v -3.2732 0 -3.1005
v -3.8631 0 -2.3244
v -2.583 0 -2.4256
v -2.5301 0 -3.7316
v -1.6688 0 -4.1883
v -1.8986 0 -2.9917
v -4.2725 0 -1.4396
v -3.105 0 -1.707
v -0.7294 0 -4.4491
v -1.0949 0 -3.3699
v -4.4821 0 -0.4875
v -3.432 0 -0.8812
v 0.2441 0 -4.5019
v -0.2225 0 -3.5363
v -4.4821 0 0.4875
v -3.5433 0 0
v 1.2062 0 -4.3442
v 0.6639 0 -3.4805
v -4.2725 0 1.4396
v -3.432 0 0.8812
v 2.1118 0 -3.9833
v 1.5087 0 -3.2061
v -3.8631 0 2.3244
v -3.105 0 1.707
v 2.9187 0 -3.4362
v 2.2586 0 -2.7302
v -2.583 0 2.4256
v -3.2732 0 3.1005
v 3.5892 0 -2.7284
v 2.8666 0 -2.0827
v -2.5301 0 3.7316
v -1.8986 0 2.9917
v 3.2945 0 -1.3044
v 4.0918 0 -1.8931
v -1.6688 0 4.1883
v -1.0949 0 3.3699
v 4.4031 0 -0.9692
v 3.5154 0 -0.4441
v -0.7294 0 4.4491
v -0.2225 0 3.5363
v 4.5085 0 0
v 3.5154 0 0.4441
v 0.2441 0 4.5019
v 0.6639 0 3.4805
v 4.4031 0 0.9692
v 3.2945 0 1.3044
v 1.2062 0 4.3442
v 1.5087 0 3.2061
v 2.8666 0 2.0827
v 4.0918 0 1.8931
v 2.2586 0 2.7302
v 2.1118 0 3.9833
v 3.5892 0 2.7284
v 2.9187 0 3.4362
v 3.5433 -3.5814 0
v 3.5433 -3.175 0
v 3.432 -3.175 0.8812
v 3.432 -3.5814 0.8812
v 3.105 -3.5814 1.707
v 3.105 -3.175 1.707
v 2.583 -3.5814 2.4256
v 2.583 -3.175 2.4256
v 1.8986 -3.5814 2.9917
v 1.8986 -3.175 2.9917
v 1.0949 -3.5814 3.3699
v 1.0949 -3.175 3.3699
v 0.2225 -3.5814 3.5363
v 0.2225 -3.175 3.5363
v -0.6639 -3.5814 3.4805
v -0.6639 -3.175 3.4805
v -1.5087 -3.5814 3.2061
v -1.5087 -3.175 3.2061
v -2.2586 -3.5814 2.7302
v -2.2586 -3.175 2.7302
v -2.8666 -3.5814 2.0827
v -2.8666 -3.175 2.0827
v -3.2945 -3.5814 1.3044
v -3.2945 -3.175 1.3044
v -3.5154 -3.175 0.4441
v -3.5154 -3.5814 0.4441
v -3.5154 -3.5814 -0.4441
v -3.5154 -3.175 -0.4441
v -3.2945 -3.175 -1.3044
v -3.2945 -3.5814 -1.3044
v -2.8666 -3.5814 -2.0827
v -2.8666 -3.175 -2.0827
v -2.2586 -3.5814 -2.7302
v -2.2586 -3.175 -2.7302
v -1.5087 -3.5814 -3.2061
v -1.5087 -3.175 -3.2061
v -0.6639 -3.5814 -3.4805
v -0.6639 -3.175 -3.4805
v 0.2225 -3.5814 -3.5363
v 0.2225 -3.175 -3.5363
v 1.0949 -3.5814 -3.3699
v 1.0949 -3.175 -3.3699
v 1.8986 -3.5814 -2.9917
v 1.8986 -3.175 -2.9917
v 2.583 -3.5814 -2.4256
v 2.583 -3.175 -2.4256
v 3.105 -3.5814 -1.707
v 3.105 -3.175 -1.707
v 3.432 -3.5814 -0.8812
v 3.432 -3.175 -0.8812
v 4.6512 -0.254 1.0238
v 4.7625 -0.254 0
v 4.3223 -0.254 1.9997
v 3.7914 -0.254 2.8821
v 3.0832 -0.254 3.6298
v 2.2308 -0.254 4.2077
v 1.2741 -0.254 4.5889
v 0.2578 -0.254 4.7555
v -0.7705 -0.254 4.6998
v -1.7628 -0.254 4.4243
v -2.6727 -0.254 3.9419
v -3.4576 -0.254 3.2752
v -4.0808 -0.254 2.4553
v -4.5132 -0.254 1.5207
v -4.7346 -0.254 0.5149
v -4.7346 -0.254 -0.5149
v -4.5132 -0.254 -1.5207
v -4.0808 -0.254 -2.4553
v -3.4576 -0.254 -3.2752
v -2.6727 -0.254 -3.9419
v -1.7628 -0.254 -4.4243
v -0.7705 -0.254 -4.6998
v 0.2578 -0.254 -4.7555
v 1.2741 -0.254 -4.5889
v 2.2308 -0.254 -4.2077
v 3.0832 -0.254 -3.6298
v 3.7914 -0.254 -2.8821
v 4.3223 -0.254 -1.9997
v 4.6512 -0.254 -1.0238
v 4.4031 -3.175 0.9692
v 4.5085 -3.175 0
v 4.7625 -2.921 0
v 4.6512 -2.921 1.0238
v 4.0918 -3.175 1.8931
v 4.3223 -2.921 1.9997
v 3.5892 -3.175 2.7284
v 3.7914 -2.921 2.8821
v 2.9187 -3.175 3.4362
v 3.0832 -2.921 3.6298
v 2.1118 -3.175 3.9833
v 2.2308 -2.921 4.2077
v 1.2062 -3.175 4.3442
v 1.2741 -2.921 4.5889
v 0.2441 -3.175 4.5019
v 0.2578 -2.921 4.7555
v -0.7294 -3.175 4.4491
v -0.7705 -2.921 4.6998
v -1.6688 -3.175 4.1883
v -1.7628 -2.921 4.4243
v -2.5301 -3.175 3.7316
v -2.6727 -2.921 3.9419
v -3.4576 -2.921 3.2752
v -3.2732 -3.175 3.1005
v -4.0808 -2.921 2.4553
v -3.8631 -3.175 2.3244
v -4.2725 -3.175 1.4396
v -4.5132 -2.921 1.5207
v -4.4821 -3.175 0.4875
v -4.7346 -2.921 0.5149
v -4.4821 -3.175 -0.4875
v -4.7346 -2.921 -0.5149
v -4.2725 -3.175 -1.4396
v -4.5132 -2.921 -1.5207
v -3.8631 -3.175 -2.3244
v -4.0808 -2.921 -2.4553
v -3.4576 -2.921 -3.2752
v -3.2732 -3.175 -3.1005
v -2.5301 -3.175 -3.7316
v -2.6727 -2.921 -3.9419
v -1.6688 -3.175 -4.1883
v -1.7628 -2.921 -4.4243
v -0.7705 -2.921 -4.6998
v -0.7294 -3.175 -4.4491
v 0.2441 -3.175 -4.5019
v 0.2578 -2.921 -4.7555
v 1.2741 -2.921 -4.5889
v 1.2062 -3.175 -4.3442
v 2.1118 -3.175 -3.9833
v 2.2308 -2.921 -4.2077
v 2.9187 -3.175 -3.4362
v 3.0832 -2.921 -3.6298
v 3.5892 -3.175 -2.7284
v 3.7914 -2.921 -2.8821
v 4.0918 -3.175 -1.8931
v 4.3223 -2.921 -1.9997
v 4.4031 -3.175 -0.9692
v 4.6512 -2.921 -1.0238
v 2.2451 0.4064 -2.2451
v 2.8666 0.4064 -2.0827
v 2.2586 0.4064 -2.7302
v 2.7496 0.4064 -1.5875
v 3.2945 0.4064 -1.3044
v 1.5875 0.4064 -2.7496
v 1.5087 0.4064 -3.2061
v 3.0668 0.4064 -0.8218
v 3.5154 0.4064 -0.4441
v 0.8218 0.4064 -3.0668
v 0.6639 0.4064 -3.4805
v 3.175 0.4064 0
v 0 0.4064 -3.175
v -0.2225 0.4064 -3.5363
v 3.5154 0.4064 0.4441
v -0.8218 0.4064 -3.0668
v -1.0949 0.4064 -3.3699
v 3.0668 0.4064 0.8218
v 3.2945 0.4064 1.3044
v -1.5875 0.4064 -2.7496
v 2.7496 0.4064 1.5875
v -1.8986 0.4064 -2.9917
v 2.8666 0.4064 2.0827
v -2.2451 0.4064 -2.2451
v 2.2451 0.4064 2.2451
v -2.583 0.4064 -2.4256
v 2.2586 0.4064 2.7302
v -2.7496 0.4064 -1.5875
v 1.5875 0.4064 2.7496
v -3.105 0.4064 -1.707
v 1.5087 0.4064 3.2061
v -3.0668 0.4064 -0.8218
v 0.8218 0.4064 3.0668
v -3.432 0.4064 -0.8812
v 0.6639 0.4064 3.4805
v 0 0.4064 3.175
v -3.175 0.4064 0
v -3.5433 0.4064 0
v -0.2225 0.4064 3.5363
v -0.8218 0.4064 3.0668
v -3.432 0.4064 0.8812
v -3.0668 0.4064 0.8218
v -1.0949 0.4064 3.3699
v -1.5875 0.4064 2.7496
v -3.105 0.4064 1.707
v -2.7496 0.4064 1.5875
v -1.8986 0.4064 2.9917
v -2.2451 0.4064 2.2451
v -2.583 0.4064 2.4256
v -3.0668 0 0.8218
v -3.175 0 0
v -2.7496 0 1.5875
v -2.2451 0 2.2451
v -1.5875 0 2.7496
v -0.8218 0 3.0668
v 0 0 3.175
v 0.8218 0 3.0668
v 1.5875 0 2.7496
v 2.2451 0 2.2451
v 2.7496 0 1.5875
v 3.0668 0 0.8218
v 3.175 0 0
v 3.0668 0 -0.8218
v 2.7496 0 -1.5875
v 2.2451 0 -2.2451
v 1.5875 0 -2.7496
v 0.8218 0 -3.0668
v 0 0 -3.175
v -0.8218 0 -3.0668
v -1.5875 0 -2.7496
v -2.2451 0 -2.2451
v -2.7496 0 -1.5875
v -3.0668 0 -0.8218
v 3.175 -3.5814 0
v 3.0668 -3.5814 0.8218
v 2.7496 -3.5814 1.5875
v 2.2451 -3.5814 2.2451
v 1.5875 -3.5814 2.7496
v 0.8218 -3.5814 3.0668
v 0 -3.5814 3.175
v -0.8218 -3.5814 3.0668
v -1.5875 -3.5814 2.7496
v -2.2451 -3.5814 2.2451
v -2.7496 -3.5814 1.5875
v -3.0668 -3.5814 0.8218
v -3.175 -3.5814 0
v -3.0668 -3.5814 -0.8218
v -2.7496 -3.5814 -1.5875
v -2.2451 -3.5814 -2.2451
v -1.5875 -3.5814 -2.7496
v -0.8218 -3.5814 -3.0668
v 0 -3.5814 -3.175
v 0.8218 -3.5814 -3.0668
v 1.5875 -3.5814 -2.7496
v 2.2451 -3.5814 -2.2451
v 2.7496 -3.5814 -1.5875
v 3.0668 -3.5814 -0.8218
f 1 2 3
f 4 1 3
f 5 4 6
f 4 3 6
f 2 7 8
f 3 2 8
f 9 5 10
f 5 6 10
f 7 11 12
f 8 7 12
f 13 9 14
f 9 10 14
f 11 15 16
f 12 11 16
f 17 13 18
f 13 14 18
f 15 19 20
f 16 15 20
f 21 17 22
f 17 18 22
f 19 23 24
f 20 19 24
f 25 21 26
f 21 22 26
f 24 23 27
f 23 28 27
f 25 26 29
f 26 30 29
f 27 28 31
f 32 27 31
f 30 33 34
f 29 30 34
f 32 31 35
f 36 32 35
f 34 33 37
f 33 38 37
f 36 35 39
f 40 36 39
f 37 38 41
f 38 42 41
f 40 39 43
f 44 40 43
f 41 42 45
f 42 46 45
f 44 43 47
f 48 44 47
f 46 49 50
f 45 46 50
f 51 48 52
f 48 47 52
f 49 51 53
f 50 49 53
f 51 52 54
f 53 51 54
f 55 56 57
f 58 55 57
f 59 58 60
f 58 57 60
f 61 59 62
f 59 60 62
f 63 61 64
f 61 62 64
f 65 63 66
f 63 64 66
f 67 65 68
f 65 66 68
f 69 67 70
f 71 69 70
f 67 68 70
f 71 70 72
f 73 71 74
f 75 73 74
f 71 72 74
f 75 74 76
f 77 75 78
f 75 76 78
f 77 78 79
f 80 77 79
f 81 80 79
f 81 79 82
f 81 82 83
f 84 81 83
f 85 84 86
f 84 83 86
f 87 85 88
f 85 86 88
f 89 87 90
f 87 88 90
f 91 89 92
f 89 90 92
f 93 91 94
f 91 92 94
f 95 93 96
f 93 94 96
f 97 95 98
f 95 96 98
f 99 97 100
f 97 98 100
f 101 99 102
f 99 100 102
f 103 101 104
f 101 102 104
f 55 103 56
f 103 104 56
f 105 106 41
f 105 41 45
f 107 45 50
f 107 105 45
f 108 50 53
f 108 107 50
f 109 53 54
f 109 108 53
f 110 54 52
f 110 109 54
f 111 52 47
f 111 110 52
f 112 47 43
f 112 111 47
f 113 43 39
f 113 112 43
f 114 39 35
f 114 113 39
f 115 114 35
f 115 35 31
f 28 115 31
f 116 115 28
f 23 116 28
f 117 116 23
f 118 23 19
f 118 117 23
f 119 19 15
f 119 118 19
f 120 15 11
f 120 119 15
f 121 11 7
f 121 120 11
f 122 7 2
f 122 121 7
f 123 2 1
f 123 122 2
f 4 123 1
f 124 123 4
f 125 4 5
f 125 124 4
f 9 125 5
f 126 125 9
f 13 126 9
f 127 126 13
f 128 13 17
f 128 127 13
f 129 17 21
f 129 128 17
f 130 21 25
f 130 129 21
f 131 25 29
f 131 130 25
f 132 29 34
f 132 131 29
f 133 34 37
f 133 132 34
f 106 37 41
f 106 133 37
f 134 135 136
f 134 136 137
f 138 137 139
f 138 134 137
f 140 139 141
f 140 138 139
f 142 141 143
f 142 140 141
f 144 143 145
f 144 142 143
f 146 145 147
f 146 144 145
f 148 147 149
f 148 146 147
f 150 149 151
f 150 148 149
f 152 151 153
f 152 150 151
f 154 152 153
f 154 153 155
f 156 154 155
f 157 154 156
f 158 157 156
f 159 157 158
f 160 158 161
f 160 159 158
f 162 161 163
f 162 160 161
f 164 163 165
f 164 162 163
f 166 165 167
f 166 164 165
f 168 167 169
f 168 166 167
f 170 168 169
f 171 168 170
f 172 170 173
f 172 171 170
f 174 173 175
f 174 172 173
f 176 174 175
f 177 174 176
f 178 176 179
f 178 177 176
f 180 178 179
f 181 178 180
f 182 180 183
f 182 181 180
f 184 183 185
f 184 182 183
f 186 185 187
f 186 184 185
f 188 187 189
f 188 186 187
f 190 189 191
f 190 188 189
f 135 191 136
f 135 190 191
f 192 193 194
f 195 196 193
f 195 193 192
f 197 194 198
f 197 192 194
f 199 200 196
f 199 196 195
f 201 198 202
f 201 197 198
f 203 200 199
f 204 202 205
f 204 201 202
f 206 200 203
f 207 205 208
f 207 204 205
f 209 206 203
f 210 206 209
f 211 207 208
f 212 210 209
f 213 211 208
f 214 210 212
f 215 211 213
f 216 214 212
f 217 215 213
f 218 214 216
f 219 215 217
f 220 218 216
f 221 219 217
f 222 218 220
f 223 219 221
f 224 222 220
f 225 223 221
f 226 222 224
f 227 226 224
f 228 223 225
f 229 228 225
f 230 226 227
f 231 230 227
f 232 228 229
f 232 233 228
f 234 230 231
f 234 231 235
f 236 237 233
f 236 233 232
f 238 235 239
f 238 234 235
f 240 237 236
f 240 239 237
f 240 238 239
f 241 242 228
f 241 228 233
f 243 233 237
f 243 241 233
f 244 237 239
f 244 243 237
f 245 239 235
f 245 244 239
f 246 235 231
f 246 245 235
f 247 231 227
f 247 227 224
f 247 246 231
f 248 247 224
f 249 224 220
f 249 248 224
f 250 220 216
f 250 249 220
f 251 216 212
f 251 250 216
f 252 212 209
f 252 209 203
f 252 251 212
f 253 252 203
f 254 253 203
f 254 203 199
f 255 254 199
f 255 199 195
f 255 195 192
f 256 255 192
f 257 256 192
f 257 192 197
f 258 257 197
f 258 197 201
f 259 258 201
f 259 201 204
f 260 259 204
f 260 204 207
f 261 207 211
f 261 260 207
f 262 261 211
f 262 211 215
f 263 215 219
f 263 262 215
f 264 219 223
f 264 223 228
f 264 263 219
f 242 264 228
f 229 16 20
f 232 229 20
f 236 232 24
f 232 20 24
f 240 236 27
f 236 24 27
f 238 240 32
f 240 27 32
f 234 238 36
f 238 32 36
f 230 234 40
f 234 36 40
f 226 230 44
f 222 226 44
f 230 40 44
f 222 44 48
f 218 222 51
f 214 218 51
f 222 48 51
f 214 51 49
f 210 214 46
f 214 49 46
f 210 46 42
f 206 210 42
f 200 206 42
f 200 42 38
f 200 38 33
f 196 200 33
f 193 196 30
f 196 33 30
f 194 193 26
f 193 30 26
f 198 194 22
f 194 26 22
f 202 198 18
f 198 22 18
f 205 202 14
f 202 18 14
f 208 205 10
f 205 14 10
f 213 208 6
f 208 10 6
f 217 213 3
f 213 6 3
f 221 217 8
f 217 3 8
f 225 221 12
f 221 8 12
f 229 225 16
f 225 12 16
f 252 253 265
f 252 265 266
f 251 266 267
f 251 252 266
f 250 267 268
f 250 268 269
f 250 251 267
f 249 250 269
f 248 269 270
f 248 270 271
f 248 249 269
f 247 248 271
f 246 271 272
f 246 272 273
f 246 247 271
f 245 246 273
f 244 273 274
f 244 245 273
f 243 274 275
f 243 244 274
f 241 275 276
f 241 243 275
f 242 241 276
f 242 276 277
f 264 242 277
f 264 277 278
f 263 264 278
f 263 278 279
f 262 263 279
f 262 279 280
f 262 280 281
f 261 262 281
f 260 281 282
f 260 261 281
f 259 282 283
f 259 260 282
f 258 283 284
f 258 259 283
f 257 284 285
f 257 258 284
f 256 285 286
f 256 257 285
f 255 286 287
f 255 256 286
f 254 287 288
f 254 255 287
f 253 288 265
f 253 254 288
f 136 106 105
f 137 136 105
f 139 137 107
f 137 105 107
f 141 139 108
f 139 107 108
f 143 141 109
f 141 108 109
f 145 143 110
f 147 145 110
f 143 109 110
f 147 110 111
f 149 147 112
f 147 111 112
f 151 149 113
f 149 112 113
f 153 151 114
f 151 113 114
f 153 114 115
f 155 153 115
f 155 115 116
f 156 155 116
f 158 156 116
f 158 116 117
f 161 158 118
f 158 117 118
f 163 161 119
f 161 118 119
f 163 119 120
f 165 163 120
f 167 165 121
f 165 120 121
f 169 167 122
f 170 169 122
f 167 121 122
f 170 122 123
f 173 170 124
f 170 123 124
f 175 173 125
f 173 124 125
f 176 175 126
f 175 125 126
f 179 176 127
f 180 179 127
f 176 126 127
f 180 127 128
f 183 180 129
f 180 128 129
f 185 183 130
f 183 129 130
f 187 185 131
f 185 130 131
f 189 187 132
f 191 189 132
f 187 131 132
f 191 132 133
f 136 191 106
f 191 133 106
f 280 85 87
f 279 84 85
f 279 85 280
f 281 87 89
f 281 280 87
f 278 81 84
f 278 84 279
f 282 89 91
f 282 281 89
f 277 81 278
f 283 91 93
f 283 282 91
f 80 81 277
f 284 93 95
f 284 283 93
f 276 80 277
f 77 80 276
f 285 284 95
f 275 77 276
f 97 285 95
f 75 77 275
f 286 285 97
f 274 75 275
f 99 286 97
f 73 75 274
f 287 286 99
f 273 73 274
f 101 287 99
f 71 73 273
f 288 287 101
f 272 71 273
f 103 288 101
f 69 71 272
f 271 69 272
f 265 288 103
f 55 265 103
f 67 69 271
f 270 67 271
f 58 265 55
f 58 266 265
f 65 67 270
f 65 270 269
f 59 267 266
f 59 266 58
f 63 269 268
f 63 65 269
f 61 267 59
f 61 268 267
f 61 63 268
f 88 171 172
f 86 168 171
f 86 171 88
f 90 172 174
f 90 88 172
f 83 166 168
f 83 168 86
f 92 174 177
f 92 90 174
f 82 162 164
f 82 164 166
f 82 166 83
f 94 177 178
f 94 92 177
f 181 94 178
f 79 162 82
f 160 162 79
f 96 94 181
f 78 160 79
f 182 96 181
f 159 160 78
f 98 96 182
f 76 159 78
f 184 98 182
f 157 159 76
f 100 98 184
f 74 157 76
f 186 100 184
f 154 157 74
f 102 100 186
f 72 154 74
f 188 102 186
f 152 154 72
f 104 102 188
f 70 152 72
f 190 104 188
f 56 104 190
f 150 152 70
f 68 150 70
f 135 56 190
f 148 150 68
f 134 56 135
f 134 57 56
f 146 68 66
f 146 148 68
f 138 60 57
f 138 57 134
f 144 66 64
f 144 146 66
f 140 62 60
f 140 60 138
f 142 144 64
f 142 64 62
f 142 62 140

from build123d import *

# Parameters (mm, degrees)
F0_R     = 4.7625
F0_R_2   = 3.175
F1_DEPTH = 3.175
F2_R     = 3.5433
F2_R_2   = 3.175
F3_DEPTH = 0.4064
F4_R     = 3.5433
F4_R_2   = 3.175
F5_DEPTH = 0.4064
F6_SIZE  = 0.254


with BuildPart() as f1:
    # F0 (on Front) → F1 (new body)
    with BuildSketch(Plane.XZ):
        Circle(F0_R)
        Circle(F0_R_2, mode=Mode.SUBTRACT)
    extrude(amount=F1_DEPTH)

    # F2 (on face) → F3 (join)
    with BuildSketch(Plane.XZ.offset(3.175)):
        Circle(F2_R)
        Circle(F2_R_2, mode=Mode.SUBTRACT)
    extrude(amount=F3_DEPTH)

    # F4 (on face) → F5 (join)
    with BuildSketch(Plane(origin=(0, 0, 0), x_dir=(-1, 0, 0), z_dir=(0, 1, 0))):
        Circle(F4_R)
        Circle(F4_R_2, mode=Mode.SUBTRACT)
    extrude(amount=F5_DEPTH)

    # F6
    f6_edges = [f1.edges().sort_by_distance(p)[0] for p in [
        (-4.7625, -3.175, 0),
        (-4.7625, 0, 0),
    ]]
    chamfer(f6_edges, length=F6_SIZE)


solid = f1.part
